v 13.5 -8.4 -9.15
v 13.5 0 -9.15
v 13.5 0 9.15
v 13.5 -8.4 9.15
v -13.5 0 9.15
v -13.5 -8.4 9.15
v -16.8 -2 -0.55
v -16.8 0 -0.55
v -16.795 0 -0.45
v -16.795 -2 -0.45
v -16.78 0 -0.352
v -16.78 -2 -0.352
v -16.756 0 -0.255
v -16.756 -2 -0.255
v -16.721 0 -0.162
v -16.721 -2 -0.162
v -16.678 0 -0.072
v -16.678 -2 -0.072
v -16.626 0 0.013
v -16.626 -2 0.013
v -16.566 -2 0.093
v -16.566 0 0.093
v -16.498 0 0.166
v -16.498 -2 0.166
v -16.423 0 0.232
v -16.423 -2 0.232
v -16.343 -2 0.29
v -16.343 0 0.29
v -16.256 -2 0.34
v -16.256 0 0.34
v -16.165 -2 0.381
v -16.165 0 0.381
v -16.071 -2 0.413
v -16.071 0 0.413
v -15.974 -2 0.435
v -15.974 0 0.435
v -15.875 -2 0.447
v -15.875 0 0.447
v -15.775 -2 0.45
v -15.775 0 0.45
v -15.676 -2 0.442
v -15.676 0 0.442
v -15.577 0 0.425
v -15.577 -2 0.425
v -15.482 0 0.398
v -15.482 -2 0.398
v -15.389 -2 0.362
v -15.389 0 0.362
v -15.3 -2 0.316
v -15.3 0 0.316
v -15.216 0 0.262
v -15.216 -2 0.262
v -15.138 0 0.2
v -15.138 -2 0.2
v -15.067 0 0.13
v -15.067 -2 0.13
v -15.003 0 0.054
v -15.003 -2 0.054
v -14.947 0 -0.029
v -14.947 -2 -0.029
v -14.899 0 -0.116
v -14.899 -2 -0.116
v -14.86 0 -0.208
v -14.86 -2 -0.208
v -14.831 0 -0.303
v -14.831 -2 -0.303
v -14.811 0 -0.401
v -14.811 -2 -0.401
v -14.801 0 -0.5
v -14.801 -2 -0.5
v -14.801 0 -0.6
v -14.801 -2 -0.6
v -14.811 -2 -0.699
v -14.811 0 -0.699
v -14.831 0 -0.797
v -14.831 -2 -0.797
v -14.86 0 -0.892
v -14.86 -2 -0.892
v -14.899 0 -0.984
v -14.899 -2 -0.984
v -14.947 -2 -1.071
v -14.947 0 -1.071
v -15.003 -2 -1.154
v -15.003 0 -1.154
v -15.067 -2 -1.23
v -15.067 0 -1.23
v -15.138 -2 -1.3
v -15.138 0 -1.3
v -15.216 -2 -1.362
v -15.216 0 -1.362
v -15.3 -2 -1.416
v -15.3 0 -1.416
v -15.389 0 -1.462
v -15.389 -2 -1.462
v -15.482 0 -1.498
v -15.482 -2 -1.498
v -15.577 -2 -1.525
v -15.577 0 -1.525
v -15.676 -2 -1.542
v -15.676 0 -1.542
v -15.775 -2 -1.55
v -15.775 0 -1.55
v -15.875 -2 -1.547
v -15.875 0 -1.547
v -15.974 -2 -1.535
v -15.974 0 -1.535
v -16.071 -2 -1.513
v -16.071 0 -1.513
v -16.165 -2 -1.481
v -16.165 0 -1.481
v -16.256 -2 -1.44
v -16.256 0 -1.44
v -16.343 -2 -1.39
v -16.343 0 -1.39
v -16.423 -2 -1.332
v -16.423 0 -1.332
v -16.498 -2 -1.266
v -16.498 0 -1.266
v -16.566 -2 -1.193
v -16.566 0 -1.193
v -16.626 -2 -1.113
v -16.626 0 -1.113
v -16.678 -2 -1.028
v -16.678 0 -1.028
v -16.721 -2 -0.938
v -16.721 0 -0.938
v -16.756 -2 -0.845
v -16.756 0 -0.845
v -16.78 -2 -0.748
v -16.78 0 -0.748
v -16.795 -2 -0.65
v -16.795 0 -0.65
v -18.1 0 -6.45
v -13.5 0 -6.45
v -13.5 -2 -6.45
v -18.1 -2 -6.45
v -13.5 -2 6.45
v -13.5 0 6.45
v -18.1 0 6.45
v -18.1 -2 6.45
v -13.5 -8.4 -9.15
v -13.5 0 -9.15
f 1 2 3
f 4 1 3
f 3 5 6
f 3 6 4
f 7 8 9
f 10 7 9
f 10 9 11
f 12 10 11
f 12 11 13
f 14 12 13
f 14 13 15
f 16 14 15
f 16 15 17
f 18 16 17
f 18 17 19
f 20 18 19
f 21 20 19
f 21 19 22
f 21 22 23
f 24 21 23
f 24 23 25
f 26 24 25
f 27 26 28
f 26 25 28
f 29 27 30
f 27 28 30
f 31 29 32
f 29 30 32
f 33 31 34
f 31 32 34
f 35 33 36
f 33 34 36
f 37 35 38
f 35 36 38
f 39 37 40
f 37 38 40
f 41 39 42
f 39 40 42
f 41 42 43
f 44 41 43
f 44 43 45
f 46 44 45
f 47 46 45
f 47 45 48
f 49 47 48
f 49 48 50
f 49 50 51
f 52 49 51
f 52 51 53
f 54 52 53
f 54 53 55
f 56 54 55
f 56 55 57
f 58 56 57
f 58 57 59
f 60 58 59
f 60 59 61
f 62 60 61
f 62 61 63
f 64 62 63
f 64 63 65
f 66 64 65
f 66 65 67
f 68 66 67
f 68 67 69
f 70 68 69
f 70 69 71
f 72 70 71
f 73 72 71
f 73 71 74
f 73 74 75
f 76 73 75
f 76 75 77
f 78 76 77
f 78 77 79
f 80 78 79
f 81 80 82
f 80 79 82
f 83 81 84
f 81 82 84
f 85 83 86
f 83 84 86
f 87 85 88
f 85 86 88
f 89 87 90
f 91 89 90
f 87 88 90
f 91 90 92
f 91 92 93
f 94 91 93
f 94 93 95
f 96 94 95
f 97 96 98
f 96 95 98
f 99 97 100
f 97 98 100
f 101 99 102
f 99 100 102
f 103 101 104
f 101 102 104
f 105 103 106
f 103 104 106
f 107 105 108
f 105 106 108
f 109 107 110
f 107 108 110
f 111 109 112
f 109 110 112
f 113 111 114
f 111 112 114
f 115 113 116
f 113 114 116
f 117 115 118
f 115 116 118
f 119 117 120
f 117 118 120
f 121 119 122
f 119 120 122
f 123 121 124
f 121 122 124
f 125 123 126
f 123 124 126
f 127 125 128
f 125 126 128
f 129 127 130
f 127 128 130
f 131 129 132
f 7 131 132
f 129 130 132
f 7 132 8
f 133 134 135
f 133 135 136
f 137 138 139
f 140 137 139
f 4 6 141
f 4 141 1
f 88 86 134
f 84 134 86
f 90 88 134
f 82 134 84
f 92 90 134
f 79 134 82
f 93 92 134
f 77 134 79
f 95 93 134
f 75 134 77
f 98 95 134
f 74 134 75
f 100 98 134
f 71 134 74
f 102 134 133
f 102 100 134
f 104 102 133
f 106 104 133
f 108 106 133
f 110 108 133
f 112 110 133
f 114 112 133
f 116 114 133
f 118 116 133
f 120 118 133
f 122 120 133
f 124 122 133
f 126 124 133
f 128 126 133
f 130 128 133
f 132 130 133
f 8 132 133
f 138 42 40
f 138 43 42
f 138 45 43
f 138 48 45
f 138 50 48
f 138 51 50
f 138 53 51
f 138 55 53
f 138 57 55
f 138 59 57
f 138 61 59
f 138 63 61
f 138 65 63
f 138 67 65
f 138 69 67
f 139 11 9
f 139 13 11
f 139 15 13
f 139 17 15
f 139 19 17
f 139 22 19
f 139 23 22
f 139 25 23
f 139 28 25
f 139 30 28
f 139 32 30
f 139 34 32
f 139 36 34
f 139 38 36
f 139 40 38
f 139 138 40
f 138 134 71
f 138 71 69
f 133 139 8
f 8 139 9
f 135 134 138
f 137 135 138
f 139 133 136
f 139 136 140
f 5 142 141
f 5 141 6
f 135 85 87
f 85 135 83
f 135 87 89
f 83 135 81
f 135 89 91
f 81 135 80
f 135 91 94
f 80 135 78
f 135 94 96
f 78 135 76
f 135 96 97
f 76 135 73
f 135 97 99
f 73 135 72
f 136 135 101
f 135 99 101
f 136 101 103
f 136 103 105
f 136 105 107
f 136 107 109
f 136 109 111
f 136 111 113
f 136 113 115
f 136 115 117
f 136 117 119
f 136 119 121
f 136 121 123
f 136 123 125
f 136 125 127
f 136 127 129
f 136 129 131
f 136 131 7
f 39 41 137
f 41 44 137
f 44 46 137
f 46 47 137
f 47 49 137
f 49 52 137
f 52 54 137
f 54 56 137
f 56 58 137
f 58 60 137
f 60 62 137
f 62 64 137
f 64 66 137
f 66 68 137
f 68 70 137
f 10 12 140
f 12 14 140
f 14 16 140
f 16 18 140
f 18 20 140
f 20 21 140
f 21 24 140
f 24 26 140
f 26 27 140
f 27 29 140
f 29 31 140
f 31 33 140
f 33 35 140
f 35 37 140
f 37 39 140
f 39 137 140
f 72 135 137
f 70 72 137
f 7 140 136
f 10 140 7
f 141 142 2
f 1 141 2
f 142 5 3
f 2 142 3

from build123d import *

# Parameters (mm, degrees)
F0_W     = 27
F0_H     = 18.3
F1_DEPTH = 8.4
F2_W     = 4.6
F2_H     = 12.9
F3_DEPTH = 2
F5_D     = 2


with BuildPart() as f1:
    # F0 (on Front) → F1 (new body)
    with BuildSketch(Plane.XZ):
        Rectangle(F0_W, F0_H)
    extrude(amount=F1_DEPTH)


with BuildPart() as f3:
    # F2 (on face) → F3 (new body)
    with BuildSketch(Plane(origin=(0, 0, 0), x_dir=(-1, 0, 0), z_dir=(0, 1, 0))):
        with Locations((15.8, 0)):
            Rectangle(F2_W, F2_H)
    extrude(amount=-F3_DEPTH)

    # F5 (through all)
    with Locations(Plane.XZ.offset(2)):
        with Locations((-15.8, -0.55)):
            Hole(F5_D / 2)


solid = Compound([f1.part, f3.part])
